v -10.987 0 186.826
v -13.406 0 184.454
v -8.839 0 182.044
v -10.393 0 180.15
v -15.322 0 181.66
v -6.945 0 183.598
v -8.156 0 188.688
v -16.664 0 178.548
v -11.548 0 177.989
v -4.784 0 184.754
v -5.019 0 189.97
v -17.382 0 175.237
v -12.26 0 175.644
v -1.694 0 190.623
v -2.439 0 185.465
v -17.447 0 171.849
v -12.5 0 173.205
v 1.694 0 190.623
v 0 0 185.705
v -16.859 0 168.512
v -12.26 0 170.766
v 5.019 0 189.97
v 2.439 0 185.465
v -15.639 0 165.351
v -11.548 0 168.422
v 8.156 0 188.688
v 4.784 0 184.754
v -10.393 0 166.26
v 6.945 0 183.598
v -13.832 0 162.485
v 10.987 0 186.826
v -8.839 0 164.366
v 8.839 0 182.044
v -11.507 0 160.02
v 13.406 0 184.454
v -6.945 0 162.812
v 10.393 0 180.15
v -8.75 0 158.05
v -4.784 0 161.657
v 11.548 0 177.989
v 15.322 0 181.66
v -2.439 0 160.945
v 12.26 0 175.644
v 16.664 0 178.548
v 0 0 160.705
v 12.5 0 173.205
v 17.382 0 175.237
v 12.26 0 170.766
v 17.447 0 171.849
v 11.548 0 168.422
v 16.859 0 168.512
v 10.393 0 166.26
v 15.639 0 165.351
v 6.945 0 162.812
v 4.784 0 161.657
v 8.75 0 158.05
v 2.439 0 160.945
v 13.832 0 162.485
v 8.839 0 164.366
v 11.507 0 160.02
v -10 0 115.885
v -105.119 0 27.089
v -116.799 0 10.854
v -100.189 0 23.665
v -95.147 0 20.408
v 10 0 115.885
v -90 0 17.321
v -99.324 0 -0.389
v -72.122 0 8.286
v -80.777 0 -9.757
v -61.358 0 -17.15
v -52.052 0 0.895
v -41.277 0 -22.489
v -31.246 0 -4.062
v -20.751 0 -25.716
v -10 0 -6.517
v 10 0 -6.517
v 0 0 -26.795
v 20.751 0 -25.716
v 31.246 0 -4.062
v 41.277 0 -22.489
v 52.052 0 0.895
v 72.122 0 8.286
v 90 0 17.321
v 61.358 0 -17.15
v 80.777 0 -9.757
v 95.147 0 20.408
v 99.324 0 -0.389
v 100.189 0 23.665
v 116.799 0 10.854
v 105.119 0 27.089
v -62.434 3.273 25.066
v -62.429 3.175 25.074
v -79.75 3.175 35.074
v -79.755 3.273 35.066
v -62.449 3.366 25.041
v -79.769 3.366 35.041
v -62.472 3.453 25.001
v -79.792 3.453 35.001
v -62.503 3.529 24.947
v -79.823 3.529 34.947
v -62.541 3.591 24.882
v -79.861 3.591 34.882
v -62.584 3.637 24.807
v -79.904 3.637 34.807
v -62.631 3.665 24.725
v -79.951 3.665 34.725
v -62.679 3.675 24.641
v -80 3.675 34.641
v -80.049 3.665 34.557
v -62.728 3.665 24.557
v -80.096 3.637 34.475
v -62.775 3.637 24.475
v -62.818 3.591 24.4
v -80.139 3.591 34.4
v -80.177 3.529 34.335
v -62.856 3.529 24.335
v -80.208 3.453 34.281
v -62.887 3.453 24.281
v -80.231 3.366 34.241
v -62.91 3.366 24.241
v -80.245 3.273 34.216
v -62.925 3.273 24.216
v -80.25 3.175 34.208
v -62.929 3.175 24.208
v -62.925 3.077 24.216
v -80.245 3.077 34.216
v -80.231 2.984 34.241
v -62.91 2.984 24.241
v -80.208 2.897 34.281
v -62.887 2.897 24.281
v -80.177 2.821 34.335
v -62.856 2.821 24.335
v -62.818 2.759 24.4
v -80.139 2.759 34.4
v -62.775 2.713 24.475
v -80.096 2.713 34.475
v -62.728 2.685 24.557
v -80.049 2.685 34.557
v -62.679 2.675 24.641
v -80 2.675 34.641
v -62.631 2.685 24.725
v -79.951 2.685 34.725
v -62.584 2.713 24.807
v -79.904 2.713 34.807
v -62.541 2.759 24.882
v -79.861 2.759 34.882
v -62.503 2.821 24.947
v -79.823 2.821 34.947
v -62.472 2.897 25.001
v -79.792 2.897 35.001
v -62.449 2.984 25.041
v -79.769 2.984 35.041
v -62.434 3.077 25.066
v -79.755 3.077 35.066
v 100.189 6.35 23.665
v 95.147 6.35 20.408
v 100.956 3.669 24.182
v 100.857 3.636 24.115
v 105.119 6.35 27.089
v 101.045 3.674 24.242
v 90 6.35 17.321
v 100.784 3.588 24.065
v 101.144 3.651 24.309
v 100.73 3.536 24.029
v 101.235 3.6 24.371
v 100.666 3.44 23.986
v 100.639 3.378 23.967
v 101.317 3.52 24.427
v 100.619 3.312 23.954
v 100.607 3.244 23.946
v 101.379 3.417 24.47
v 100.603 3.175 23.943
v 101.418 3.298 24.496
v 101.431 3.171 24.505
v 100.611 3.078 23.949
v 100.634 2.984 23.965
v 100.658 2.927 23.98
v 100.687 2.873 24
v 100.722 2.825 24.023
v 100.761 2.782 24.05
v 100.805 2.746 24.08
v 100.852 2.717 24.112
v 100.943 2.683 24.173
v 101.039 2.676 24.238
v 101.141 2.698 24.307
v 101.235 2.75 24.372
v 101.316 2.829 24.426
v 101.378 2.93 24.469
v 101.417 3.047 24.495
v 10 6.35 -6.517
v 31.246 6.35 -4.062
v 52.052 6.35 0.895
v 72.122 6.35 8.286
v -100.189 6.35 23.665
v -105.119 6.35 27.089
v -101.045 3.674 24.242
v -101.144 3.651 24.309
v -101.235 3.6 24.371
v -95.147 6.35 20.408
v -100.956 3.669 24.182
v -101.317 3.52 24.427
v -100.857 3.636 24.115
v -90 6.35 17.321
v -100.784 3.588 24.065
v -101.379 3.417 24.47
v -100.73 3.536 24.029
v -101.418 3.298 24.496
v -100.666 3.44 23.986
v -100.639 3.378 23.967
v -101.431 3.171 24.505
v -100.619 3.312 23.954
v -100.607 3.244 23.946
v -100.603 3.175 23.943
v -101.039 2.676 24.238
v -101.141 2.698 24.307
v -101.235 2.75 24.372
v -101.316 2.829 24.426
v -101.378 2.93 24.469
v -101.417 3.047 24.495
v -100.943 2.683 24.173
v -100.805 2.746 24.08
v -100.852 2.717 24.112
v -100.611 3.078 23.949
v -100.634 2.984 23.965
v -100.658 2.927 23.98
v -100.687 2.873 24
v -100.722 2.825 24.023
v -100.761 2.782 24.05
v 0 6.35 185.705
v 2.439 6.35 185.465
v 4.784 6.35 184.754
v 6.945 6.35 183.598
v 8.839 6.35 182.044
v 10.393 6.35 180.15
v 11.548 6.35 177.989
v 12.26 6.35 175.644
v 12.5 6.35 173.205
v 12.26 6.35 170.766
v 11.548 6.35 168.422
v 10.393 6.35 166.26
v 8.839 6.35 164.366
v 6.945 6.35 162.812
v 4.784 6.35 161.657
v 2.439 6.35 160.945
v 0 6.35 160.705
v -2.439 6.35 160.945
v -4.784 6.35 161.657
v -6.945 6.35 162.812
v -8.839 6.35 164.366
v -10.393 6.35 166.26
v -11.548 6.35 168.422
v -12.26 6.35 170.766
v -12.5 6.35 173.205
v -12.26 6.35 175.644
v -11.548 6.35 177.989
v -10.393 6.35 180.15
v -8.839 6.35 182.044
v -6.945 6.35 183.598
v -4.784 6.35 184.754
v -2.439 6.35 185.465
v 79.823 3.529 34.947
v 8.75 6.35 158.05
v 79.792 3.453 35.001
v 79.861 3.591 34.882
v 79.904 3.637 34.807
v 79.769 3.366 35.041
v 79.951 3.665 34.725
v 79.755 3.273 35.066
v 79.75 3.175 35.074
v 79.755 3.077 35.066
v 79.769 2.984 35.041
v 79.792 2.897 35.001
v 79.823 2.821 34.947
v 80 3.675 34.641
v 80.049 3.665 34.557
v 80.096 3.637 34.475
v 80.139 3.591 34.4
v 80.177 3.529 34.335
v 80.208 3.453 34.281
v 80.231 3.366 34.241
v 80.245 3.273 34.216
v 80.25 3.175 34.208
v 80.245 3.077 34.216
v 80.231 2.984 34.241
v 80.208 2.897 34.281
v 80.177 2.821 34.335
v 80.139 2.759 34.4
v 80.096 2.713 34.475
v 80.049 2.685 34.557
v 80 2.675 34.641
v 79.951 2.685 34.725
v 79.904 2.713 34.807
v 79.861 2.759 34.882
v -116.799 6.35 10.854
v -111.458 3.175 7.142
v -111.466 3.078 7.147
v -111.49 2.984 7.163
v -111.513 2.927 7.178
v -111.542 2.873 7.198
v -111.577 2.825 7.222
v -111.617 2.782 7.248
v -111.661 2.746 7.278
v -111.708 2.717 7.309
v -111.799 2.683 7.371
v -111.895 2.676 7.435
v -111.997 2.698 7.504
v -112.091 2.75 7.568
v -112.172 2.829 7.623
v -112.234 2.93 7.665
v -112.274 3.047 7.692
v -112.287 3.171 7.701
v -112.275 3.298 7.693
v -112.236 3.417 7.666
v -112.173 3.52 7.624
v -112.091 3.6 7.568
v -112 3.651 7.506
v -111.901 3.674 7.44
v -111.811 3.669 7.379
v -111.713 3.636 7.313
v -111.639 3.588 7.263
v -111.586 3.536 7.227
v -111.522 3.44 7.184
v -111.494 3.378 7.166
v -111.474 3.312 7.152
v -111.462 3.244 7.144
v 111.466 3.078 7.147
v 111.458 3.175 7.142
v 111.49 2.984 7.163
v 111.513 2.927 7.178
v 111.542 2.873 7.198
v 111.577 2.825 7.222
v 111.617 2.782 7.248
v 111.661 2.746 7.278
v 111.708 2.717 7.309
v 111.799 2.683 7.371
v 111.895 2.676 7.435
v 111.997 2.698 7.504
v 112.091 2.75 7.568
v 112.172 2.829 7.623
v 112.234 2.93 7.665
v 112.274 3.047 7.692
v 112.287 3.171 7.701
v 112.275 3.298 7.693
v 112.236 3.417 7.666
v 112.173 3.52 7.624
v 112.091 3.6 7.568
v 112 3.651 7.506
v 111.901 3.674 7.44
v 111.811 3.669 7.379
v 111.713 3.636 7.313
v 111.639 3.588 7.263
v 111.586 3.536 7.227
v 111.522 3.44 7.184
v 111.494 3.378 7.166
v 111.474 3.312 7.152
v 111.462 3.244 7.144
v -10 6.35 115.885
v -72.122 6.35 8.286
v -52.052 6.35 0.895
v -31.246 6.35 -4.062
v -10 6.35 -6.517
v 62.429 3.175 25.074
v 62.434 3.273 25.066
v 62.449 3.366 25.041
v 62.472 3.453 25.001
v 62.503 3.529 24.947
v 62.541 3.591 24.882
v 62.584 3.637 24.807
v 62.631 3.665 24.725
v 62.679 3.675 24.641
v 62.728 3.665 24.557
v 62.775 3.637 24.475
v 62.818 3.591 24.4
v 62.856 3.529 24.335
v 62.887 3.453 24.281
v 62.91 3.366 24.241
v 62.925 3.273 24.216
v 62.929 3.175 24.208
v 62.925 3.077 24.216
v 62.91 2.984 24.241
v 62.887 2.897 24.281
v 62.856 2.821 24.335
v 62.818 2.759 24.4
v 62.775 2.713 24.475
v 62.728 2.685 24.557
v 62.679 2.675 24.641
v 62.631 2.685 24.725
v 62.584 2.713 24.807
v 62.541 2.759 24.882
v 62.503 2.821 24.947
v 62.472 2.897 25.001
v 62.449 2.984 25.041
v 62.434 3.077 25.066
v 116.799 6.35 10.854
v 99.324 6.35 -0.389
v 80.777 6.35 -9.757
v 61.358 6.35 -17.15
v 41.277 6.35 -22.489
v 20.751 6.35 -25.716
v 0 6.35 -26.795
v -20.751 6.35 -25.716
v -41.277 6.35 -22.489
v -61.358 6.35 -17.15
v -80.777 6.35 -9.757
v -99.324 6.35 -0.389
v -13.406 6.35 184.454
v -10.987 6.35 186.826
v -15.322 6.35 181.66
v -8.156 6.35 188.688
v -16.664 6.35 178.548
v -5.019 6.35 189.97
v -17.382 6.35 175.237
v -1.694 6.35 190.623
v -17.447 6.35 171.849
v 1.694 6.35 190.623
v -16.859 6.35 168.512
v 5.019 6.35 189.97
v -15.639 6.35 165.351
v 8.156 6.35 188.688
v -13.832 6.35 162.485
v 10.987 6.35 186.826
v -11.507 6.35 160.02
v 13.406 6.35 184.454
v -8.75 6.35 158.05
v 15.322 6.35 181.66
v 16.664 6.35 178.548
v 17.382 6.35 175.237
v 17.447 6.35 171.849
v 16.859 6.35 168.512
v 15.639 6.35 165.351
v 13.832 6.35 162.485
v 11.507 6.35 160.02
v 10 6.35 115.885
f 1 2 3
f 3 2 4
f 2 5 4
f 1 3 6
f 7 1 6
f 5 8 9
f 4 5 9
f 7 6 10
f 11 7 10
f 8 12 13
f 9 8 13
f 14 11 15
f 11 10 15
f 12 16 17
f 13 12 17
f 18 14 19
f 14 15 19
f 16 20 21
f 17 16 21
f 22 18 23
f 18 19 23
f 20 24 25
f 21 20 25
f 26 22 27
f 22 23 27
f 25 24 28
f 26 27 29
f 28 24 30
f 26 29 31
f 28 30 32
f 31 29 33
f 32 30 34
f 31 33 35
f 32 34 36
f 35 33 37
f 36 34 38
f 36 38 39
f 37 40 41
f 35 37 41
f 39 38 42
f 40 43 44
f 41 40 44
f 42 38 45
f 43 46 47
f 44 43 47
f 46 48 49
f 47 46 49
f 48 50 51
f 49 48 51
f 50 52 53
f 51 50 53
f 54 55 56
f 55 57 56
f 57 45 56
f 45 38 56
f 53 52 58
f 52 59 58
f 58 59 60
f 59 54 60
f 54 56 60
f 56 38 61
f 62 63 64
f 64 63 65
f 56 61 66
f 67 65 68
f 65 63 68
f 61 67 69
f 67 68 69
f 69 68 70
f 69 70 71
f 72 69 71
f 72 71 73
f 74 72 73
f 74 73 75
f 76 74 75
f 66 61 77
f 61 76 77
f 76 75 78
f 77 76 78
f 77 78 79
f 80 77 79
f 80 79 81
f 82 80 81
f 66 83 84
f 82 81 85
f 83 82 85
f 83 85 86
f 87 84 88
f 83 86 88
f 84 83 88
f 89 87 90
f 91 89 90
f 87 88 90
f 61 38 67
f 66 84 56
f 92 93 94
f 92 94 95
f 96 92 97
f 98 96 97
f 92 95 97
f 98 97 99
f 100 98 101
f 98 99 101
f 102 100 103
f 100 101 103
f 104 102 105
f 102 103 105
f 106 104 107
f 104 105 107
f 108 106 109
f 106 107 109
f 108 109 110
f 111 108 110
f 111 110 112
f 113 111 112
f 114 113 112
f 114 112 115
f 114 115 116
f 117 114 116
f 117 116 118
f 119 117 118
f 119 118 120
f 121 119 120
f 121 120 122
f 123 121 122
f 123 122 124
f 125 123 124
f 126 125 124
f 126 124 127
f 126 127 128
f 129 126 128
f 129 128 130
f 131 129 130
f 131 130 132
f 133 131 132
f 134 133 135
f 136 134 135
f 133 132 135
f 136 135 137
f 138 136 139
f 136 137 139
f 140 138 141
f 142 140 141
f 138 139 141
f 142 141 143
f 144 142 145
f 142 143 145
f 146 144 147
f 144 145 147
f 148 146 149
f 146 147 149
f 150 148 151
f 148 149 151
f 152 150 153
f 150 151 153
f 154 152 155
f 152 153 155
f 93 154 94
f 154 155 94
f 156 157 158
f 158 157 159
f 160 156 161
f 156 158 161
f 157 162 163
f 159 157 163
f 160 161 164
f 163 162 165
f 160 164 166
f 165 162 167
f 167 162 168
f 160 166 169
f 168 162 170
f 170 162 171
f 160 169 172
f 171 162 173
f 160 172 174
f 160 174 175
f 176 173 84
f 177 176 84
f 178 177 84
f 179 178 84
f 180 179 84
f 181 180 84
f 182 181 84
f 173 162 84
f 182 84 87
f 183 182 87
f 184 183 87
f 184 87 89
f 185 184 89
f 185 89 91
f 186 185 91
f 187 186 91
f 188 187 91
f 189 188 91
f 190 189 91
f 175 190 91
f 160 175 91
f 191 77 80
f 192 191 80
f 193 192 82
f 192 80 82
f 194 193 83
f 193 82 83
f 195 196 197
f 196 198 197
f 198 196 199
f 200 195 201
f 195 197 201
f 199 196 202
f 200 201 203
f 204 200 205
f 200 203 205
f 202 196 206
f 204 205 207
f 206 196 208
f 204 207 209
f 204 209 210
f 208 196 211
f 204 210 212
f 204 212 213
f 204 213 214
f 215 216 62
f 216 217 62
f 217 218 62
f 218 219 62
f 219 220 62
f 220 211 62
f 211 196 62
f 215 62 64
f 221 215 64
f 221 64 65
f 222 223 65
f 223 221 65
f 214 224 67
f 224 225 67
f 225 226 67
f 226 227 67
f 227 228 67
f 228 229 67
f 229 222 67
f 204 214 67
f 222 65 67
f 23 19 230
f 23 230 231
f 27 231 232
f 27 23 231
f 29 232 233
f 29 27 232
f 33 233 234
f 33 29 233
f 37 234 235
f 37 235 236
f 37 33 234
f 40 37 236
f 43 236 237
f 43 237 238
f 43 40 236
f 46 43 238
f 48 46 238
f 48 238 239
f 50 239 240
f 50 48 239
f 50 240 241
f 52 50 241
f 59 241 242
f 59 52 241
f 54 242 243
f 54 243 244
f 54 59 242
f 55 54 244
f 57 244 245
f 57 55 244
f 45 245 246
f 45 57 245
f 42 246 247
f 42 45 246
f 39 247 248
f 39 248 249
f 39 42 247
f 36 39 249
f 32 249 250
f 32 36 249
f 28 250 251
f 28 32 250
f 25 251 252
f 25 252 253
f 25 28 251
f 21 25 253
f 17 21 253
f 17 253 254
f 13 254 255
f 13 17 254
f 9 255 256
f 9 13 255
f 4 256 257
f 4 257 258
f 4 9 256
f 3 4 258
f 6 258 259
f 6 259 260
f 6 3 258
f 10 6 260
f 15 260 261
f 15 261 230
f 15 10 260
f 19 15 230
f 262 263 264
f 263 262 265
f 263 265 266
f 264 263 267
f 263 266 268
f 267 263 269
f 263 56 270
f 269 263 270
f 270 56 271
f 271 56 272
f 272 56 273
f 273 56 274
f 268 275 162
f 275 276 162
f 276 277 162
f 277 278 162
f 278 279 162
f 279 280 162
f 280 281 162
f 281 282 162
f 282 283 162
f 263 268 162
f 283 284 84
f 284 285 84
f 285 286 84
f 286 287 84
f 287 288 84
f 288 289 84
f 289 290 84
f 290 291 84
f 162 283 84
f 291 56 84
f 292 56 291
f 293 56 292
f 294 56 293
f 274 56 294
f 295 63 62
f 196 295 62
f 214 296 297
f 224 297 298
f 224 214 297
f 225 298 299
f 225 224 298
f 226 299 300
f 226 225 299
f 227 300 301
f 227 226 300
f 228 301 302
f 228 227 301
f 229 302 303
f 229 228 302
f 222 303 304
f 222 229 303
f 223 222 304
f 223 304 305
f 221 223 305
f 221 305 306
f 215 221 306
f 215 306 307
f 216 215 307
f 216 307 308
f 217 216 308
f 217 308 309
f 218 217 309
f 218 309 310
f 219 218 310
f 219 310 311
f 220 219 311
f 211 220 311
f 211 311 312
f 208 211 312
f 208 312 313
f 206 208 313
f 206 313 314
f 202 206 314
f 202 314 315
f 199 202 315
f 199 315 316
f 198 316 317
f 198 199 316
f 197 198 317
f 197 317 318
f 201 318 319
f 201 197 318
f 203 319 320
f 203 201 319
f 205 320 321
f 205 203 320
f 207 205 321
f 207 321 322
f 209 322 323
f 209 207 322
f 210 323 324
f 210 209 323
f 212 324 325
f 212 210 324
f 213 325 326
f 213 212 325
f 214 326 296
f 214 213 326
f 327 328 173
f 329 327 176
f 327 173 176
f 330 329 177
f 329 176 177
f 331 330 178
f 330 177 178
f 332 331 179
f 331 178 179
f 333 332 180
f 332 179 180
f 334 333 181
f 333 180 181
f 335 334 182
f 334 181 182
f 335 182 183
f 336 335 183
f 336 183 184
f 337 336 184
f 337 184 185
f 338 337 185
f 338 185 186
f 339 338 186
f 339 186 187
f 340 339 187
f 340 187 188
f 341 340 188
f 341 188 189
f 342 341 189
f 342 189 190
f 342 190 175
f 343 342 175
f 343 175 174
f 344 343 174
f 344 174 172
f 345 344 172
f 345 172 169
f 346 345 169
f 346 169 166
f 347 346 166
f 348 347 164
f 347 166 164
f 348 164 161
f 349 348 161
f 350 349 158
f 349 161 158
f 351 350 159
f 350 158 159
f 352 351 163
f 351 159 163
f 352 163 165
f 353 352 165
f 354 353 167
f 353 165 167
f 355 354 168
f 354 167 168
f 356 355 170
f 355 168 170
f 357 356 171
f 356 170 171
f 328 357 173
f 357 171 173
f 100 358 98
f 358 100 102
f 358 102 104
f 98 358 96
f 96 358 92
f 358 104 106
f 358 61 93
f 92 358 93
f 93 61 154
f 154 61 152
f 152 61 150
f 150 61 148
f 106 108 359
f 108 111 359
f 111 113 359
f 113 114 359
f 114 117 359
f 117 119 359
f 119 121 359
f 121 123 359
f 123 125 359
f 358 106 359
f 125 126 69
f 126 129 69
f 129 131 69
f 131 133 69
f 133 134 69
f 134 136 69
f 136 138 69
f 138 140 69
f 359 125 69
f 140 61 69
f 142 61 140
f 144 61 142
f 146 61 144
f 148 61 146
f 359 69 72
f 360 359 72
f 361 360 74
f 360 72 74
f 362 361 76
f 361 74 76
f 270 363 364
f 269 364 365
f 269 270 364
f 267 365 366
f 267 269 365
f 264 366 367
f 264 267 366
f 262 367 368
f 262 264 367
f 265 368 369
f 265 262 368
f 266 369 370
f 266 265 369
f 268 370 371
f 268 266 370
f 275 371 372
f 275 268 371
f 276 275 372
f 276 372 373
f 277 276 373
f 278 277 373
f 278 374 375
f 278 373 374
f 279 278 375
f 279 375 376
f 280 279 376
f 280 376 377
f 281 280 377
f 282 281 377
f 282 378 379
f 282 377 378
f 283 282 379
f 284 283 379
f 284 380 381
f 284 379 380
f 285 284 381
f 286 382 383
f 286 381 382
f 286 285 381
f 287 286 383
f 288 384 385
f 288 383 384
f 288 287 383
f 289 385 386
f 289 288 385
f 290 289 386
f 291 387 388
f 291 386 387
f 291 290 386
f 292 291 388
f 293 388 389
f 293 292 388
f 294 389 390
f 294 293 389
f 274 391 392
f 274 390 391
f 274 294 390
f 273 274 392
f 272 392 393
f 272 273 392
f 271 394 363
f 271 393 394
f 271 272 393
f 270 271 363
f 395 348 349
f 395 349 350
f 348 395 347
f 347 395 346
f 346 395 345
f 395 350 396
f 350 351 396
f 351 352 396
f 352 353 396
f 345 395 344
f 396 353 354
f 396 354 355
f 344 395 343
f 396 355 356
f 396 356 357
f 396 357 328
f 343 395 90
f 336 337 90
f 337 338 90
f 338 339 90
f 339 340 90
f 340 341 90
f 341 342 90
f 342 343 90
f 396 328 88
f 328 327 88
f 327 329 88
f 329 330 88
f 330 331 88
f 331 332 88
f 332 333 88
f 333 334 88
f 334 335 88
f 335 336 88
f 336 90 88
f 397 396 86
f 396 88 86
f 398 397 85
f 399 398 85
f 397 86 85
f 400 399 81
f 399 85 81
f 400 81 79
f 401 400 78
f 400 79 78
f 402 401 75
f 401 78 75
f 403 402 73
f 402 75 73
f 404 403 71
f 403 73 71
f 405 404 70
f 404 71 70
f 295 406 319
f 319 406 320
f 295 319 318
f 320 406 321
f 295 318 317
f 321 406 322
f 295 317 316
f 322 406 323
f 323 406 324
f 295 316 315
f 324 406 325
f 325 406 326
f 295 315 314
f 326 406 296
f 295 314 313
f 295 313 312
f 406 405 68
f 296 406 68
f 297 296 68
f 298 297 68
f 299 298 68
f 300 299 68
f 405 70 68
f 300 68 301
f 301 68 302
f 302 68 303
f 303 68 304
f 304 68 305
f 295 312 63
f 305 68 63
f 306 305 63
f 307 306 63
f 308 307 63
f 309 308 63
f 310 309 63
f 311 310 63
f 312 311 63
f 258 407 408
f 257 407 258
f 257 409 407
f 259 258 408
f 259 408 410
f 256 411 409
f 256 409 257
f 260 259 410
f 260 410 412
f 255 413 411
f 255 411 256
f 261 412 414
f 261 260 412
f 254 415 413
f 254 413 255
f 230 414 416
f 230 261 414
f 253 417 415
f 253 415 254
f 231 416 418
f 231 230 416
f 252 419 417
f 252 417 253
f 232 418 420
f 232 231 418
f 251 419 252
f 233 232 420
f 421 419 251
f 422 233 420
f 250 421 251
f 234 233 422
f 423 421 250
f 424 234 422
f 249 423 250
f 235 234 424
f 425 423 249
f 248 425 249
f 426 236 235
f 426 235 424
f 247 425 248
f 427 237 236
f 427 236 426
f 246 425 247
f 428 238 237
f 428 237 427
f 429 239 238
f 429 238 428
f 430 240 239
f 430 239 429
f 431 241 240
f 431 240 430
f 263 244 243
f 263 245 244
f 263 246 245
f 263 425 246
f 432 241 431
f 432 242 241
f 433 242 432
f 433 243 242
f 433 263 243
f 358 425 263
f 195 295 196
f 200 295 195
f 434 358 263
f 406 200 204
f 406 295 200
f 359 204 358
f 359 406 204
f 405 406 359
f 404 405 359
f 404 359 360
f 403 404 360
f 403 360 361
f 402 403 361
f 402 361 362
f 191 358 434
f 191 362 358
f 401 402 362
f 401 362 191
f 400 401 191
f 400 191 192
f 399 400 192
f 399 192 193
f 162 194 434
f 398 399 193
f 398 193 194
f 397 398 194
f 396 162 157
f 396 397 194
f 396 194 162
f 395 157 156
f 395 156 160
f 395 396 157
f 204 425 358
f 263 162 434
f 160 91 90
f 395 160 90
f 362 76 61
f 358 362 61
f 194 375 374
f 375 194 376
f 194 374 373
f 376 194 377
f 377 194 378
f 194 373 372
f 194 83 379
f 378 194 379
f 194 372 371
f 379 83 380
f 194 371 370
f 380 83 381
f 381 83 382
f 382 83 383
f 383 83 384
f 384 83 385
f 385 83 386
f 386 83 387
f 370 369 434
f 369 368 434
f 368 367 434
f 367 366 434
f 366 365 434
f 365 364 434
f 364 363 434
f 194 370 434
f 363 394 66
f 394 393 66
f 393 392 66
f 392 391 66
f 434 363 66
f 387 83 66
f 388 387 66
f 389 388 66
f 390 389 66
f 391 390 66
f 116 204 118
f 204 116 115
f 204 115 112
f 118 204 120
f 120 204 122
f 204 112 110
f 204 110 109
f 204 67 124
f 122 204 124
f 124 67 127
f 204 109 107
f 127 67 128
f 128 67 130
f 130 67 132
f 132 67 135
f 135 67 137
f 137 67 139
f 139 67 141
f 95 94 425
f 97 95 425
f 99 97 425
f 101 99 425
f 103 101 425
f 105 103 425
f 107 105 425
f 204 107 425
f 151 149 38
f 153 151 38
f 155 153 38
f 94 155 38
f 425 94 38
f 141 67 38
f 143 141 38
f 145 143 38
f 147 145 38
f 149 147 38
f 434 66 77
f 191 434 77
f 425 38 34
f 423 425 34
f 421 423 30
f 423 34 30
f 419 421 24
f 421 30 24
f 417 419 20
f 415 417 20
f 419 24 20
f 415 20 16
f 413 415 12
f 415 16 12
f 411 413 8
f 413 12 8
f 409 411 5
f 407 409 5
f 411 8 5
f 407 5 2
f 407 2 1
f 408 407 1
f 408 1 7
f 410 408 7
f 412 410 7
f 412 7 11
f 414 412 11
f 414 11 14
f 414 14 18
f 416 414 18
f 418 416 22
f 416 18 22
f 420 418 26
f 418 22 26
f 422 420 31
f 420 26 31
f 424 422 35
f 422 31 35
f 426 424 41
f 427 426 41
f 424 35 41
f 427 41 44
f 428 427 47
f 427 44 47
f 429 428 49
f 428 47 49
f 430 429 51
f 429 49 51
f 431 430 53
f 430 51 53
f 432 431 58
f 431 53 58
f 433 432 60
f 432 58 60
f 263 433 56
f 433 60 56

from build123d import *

# Parameters (mm, degrees)
SKETCH1_R           = 12.5
BOSS_EXTRUDE1_DEPTH = 6.35
SKETCH2_R           = 0.5
CUT_EXTRUDE1_DEPTH  = 21
SKETCH4_R           = 0.5
CUT_EXTRUDE2_DEPTH  = 258.99218142


with BuildPart() as part:
    # Sketch1 → Boss-Extrude1 (new body)
    with BuildSketch(Plane(origin=(0, 0, 0), x_dir=(1, 0, 0), z_dir=(0, 1, 0))):
        with BuildLine():
            ThreePointArc((-105.118959503, -27.088673899), (-97.681658234, -22.015485729), (-90, -17.320508076))
            Line((-90, -17.320508076), (-8.75, -158.049636191))
            ThreePointArc((-8.75, -158.049636191), (0, -190.705080757), (8.75, -158.049636191))
            Line((8.75, -158.049636191), (90, -17.320508076))
            ThreePointArc((90, -17.320508076), (97.681658234, -22.015485729), (105.118959503, -27.088673899))
            Line((105.118959503, -27.088673899), (116.798843892, -10.853517582))
            ThreePointArc((116.798843892, -10.853517582), (0, 26.794919243), (-116.798843892, -10.853517582))
            Line((-116.798843892, -10.853517582), (-105.118959503, -27.088673899))
        make_face()
        with Locations(Location((0, -173.205080757, 0), (0, 0, 270))):
            Circle(SKETCH1_R, mode=Mode.SUBTRACT)
        with BuildLine():
            Line((-10, -115.884572681), (-72.122211024, -8.285746909))
            ThreePointArc((-72.122211024, -8.285746909), (-41.722825565, 1.892622903), (-10, 6.516926799))
            Line((-10, 6.516926799), (-10, -115.884572681))
        make_face(mode=Mode.SUBTRACT)
        with BuildLine():
            Line((72.122211024, -8.285746909), (10, -115.884572681))
            Line((10, -115.884572681), (10, 6.516926799))
            ThreePointArc((10, 6.516926799), (41.722825565, 1.892622903), (72.122211024, -8.285746909))
        make_face(mode=Mode.SUBTRACT)
    extrude(amount=BOSS_EXTRUDE1_DEPTH)

    # Sketch2 → Cut-Extrude1 (cut)
    with BuildSketch(Plane(origin=(-75, 0, 43.301270189), x_dir=(0.499999999999998, 0, 0.8660254037844398), z_dir=(-0.8660254037844399, 0, 0.49999999999999806))):
        with Locations((-10, 3.175)):
            Circle(SKETCH2_R)
    cut_extrude1 = extrude(amount=-CUT_EXTRUDE1_DEPTH, mode=Mode.SUBTRACT)

    # Sketch4 → Cut-Extrude2 (cut, through all)
    with BuildSketch(Plane(origin=(-18.609768778, 0, -28.803804686), x_dir=(-0.8399421946003115, 0, 0.5426758790751738), z_dir=(-0.5426758790751737, 0, -0.8399421946003114))):
        with Locations(Location((97.99421946, 3.175, 0), (0, 0, 180))):
            Circle(SKETCH4_R)
    cut_extrude2 = extrude(amount=CUT_EXTRUDE2_DEPTH, mode=Mode.SUBTRACT)

    # Mirror1: Cut-Extrude1, Cut-Extrude2 across plane
    add(cut_extrude1.mirror(Plane(origin=(0, 0, 0), x_dir=(0, 0, 1), z_dir=(1, 0, 0))), mode=Mode.SUBTRACT)
    add(cut_extrude2.mirror(Plane(origin=(0, 0, 0), x_dir=(0, 0, 1), z_dir=(1, 0, 0))), mode=Mode.SUBTRACT)


solid = part.part
